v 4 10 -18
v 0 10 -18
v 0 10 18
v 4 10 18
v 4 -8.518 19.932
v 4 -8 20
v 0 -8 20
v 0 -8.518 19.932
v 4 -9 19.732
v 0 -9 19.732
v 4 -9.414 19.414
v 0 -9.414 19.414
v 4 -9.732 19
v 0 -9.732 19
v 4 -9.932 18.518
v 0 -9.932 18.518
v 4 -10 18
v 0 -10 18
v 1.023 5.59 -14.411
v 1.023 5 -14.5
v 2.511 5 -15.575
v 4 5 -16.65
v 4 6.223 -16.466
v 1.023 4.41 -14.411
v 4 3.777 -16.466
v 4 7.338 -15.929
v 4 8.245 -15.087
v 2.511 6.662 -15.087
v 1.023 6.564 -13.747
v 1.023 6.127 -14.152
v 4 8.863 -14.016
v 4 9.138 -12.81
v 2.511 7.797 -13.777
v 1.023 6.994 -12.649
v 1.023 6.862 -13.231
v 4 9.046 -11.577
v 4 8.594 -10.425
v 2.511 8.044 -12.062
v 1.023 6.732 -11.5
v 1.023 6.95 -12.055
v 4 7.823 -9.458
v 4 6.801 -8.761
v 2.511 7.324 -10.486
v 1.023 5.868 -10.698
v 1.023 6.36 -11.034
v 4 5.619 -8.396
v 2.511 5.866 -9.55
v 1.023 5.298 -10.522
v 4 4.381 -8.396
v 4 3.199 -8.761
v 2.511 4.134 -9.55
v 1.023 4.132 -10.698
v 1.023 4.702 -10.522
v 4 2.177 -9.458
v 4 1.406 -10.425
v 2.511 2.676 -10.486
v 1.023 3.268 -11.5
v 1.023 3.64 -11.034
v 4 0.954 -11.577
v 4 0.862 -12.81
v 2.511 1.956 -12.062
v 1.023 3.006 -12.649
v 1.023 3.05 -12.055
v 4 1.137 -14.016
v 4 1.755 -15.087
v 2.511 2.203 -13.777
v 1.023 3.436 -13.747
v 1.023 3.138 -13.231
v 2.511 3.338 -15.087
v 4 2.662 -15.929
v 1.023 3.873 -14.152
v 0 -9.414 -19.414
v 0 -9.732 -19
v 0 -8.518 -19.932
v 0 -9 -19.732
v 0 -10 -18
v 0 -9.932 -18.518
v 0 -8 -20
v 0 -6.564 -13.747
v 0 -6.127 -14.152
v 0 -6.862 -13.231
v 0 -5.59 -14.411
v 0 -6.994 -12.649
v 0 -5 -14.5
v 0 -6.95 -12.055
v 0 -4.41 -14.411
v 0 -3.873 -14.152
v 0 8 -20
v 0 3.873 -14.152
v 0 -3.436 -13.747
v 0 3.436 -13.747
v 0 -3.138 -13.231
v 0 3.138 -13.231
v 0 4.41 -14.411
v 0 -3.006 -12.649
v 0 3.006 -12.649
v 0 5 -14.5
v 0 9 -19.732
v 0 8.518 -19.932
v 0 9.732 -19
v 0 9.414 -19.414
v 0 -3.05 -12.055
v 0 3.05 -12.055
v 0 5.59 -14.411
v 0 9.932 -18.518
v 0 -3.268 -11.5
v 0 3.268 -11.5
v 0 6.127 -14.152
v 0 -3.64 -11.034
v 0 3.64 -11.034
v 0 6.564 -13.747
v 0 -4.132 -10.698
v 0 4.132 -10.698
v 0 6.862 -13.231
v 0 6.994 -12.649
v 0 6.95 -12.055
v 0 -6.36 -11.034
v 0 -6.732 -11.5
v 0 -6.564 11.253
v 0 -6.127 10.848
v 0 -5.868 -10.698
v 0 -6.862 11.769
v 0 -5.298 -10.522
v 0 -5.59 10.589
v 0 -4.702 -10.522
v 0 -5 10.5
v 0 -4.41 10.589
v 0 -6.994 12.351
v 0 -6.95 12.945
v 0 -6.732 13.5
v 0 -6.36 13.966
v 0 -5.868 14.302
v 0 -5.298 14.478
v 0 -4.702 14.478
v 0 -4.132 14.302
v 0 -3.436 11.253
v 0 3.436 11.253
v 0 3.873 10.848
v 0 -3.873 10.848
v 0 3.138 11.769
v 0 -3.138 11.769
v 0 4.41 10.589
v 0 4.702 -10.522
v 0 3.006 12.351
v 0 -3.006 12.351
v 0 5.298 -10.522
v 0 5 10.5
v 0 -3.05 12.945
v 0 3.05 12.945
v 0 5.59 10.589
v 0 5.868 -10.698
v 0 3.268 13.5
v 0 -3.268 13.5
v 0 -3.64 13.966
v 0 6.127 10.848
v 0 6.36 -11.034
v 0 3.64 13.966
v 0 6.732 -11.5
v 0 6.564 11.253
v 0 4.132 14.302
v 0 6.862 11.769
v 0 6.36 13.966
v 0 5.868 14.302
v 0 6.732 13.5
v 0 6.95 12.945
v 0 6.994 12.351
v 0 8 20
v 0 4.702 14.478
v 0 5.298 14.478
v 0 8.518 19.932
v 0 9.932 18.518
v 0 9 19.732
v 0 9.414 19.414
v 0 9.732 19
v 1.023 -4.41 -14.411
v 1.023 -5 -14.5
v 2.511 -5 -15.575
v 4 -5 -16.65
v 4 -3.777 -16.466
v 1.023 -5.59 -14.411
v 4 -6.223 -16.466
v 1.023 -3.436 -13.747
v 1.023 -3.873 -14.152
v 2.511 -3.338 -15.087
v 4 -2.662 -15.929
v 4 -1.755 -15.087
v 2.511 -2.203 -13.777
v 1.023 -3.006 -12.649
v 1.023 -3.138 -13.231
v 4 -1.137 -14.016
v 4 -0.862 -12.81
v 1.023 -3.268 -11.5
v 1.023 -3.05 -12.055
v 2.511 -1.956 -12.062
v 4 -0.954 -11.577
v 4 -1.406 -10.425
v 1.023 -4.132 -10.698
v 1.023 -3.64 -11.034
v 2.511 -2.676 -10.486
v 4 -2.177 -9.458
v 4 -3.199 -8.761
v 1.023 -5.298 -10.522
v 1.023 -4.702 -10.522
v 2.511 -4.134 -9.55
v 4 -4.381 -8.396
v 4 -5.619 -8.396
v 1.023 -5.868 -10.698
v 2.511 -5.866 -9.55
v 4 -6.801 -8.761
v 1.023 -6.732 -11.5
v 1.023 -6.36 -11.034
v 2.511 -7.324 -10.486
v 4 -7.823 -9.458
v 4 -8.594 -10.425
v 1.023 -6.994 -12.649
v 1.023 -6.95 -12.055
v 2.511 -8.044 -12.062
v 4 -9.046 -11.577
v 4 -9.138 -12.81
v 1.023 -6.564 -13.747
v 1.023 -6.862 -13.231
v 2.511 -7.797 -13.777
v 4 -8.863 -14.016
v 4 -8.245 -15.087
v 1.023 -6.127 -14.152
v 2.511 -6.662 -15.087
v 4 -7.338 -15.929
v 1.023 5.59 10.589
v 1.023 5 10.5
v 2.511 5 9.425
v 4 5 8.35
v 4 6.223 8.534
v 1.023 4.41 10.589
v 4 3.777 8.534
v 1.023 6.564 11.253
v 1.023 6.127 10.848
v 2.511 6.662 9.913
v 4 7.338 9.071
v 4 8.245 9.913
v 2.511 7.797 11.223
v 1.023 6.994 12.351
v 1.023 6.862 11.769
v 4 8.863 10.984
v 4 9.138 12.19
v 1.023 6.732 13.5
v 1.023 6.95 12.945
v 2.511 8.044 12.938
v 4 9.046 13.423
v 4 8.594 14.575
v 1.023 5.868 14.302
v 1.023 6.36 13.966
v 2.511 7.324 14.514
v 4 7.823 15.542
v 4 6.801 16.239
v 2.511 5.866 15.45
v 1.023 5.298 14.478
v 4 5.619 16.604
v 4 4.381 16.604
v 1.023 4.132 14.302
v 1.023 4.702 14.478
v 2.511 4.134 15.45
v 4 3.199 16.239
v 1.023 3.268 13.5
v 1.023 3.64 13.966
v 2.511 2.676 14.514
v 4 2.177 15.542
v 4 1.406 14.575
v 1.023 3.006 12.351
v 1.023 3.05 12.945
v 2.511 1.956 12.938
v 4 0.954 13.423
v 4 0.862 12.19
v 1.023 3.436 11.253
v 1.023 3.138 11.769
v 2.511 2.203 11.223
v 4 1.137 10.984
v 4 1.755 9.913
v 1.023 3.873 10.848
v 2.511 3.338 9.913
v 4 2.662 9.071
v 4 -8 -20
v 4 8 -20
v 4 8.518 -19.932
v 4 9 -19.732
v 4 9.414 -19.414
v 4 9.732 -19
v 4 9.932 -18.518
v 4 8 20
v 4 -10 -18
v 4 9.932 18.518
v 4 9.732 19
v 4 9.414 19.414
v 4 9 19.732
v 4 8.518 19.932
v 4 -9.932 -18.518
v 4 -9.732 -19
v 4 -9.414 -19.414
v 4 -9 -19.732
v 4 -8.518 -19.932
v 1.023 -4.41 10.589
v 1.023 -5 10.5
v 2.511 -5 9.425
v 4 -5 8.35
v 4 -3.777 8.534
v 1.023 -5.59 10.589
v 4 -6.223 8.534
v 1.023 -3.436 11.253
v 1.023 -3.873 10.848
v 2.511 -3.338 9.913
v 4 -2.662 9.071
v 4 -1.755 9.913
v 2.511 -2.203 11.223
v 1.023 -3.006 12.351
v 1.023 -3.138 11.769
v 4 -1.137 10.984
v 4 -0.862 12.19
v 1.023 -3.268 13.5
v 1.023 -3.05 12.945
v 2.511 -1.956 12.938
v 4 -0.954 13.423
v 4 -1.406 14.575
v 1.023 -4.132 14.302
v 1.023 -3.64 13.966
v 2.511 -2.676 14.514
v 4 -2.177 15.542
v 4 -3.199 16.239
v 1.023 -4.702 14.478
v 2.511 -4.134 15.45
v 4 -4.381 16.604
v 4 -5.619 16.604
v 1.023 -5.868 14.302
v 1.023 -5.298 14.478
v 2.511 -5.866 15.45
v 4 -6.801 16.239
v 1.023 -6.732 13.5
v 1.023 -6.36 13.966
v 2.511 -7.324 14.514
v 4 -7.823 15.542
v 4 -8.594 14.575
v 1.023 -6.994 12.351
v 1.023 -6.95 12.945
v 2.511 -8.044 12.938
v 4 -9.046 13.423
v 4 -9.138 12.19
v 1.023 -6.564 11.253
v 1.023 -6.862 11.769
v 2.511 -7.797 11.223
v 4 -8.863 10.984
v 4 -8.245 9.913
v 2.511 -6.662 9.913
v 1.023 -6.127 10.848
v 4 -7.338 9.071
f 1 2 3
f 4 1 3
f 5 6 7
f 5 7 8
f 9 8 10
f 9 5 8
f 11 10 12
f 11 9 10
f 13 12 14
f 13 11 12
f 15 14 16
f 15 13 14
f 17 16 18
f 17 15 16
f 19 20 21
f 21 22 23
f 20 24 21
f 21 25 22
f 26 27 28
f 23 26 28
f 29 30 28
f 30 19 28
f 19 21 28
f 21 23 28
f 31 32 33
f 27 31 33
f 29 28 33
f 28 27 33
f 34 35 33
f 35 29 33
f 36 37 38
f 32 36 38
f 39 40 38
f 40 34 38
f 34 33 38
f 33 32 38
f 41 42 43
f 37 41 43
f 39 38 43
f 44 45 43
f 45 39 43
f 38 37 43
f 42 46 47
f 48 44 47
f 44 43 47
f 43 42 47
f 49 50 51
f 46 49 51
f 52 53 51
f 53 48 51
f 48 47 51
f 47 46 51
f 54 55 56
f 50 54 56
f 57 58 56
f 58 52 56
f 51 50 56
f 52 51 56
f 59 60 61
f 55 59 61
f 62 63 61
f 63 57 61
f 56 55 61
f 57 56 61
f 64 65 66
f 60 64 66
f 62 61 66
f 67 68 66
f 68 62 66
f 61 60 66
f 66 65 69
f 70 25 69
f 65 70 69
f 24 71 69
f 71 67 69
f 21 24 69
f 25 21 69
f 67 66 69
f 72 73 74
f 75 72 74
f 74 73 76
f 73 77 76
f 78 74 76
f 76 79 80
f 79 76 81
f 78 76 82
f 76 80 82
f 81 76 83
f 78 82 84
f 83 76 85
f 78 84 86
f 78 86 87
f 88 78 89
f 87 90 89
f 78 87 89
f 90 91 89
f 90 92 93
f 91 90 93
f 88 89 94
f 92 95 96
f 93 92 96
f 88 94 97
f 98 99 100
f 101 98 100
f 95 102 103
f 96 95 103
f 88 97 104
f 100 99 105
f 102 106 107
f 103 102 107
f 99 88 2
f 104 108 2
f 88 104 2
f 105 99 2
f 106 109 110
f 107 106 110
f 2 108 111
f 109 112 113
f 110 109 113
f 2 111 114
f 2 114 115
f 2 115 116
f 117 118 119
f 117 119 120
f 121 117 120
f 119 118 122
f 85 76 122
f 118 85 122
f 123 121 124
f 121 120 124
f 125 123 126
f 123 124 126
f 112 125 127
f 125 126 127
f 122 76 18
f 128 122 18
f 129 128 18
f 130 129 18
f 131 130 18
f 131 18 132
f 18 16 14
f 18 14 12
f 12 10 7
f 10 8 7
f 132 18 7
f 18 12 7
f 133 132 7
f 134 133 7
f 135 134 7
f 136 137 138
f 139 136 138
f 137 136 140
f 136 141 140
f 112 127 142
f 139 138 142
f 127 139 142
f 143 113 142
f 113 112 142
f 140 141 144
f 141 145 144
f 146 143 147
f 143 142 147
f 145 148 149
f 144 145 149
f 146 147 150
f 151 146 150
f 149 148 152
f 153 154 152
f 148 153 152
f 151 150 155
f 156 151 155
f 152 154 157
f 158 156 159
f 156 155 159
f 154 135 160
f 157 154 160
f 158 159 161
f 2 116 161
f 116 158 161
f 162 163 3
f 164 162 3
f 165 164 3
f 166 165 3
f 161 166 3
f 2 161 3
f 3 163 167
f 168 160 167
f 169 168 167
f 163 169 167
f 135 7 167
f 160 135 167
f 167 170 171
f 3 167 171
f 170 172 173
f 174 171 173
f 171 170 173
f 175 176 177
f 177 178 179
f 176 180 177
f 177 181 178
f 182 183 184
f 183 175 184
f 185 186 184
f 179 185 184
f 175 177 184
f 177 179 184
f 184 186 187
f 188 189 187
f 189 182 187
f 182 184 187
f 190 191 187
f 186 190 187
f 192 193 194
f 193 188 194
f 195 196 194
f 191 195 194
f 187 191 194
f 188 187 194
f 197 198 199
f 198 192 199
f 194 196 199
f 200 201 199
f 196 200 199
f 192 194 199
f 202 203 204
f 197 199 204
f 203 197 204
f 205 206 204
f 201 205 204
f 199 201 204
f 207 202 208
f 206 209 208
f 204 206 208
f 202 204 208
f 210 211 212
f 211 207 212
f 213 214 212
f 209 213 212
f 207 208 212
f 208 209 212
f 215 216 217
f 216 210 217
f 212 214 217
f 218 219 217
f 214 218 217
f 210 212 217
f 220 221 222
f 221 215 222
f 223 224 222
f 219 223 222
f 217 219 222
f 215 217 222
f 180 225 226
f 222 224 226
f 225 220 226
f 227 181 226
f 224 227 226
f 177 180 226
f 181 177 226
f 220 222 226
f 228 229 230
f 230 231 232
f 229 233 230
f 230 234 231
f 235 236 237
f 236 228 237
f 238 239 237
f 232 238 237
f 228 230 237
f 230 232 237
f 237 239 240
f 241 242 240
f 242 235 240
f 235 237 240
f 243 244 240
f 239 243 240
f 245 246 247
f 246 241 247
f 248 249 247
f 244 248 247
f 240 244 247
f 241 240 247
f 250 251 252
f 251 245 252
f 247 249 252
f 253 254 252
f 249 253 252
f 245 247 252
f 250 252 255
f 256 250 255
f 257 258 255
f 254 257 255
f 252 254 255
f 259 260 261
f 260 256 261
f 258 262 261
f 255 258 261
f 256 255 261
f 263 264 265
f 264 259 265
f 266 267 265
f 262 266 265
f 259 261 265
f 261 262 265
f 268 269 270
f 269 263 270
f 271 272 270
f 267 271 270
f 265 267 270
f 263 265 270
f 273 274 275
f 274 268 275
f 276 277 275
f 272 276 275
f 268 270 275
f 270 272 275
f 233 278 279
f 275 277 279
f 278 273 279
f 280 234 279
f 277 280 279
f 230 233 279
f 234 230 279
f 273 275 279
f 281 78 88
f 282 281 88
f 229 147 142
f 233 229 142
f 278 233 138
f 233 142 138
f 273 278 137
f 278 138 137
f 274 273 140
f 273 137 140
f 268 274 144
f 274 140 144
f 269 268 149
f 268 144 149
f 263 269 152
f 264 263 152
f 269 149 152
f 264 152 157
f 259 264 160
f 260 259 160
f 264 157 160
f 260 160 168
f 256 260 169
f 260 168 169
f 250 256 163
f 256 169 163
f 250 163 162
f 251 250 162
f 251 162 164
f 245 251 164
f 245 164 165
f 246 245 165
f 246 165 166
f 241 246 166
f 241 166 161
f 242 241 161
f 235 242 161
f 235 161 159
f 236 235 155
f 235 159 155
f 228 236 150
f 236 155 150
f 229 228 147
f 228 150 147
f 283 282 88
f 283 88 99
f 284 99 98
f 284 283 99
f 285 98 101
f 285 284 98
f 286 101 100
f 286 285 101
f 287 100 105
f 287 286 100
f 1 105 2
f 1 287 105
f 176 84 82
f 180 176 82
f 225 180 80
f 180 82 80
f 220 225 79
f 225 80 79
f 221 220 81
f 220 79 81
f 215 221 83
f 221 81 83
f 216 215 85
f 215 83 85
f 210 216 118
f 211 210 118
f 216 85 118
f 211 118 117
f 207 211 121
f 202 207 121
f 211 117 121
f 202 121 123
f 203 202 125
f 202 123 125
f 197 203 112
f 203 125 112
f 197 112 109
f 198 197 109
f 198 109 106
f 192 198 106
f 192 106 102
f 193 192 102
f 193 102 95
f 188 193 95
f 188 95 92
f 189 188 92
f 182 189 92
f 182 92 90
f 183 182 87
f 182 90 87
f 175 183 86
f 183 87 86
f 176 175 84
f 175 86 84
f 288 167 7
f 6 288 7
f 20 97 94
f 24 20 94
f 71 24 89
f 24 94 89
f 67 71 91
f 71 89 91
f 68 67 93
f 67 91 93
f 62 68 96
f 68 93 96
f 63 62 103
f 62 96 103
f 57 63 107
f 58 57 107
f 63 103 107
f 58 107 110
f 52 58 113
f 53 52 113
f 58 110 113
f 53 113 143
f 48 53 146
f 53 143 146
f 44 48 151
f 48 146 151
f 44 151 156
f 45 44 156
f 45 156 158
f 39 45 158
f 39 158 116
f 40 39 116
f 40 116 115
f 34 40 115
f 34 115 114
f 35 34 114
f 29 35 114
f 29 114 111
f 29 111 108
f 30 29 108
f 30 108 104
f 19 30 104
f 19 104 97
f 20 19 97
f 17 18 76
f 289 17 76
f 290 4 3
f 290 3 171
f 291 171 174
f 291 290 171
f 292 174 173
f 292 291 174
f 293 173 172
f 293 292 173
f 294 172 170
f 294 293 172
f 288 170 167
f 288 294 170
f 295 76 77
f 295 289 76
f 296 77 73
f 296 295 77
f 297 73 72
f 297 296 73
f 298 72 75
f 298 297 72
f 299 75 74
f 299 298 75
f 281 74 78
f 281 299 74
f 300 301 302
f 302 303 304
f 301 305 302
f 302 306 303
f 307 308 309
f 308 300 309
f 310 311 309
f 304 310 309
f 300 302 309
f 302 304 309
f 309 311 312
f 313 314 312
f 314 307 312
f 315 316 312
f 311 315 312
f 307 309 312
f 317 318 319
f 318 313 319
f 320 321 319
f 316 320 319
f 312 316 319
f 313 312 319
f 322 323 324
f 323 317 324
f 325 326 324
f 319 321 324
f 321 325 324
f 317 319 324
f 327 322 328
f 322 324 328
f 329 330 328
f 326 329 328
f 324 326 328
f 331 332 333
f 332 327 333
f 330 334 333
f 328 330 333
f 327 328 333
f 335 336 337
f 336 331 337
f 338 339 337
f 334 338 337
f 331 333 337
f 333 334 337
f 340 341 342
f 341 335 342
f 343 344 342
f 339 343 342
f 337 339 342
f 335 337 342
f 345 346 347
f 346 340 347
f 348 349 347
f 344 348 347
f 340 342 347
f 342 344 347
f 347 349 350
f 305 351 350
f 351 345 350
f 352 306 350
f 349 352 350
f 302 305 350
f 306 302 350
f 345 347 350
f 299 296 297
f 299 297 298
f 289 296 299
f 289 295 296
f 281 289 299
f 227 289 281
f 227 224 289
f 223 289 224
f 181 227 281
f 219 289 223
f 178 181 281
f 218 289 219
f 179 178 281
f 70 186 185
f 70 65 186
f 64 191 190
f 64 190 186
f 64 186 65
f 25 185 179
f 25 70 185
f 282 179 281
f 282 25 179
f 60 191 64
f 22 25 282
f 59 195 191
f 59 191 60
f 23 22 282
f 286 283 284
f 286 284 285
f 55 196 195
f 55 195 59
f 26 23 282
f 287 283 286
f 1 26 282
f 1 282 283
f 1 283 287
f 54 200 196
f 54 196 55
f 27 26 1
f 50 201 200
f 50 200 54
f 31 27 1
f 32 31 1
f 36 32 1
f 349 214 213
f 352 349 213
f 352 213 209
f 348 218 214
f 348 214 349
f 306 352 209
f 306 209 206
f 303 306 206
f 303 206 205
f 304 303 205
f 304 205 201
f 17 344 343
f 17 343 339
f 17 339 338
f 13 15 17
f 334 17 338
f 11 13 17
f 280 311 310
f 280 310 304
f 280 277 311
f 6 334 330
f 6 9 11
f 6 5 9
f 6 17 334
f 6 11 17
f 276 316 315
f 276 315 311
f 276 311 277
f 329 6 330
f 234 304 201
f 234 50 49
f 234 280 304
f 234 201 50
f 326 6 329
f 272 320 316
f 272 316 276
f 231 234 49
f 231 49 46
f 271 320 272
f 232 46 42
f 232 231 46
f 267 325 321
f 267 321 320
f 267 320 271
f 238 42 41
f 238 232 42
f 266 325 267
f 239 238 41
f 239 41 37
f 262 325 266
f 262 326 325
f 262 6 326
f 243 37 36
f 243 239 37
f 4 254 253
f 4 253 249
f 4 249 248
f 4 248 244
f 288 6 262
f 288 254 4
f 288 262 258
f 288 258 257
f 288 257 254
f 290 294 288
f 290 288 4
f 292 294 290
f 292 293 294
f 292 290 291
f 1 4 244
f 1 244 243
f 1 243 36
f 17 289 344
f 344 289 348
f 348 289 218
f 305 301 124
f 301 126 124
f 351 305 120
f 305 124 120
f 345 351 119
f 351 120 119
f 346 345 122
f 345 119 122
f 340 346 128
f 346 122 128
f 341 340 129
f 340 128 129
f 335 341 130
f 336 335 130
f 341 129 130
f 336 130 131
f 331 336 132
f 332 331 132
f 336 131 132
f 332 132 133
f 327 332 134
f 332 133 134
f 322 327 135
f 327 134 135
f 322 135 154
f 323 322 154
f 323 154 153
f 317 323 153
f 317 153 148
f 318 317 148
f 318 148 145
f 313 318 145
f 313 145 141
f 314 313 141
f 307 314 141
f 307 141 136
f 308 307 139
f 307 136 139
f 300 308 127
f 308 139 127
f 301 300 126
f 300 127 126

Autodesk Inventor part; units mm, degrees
ref_plane "YZ Plane" through (0, 0, 0) normal (1, 0, 0) x (0, 1, 0)
ref_plane "XZ Plane" through (0, 0, 0) normal (0, 1, 0) x (-1, 0, 0)
ref_plane "XY Plane" through (0, 0, 0) normal (0, 0, 1) x (1, 0, 0)
sketch "Leg_Base_Skt" plane through (0, 0, 0) normal (1, 0, 0) x (0, 1, 0)
  line L0 (-10, -20) -> (10, -20)
  line L1 (10, -20) -> (10, 20)
  line L2 (10, 20) -> (-10, 20)
  line L3 (-10, 20) -> (-10, -20)
  line L4 (-10, -20) -> (10, 20) construction
  line L5 (10, -20) -> (-10, 20) construction
  point P0 (0, 0)
  dimension "d0" = 20
  dimension "d1" = 40
extrude "Leg_Base" add sketch "Leg_Base_Skt" along normal blind 4
sketch "Hole_Base_Skt" plane through (4, 0, 0) normal (1, 0, 0) x (0, 0, -1)
  line L0 (-5, -10) -> (-5, 10) construction
  line L1 (20, 10) -> (-20, 10) projected
  line L2 (-12.5, 0) -> (-12.5, 10) construction
  line L3 (-12.5, 0) -> (-12.5, -10) construction
  line L4 (-20, -10) -> (20, -10) construction
  line L5 (5, -10) -> (5, 10) construction
  line L6 (20, -10) -> (20, 10) construction
  line L7 (5, 0) -> (20, 0) construction
  line L8 (12.5, 0) -> (12.5, 10) construction
  line L9 (12.5, 0) -> (12.5, -10) construction
  line L10 (-20, 10) -> (-20, -10) projected
  line L11 (-20, 0) -> (-5, 0) construction
  point P0 (0, 0)
  point P1 (-12.5, -5)
  point P2 (-12.5, 5)
  point P3 (12.5, -5)
  point P4 (12.5, 5)
  dimension "d7" = 15
  dimension "d8" = 15
hole "Hole_Base" at (4, -5, 12.5) at (4, 5, 12.5) at (4, -5, -12.5) at (4, 5, -12.5) direction (-1, 0, 0) diameter 4 end through all countersink diameter 8.3 countersink angle 71.667
fillet "Fillet" radius 2 4 edges at (2, -10, 20) (2, 10, 20) (2, -10, -20) (2, 10, -20)
equation "\"d0\" = block_width"
equation "\"d1\" = ceramic_width + block_height + wood_width"
equation "\"d2\" = screw_head_height + screw_tolerance"
equation "\"d7\" = wood_width"
equation "\"d8\" = block_height"
equation "\"d28\" = screw_body_diam + screw_tolerance"
equation "\"d32\" = screw_head_m"
equation "\"d30\" = screw_head_diam"
equation "\"d33\" = screw_length"
equation "\"d4\" = fillet"
equation "\"tube_diam\" = 31.8"
equation "\"tube_tolerance\" = 0.25"
equation "\"tube_base_height\" = 2"
equation "\"tube_wall_width\" = 3"
equation "\"tube_wall_height\" = 15"
equation "\"screw_wall_width\" = 2"
equation "\"screw_length\" = 12.7"
equation "\"screw_tolerance\" = 1"
equation "\"screw_body_diam\" = 3"
equation "\"screw_head_diam\" = 8.3"
equation "\"screw_head_height\" = 3"
equation "\"screw_spacing\" = 8"
equation "\"block_width\" = 20"
equation "\"block_height\" = 15"
equation "\"ceramic_width\" = 10"
equation "\"wood_width\" = 15"
equation "\"fillet\" = 2"
equation "\"screw_head_m\" = 71.6667deg"
properties part number "Counter_Support_Ceramic_Leg"
